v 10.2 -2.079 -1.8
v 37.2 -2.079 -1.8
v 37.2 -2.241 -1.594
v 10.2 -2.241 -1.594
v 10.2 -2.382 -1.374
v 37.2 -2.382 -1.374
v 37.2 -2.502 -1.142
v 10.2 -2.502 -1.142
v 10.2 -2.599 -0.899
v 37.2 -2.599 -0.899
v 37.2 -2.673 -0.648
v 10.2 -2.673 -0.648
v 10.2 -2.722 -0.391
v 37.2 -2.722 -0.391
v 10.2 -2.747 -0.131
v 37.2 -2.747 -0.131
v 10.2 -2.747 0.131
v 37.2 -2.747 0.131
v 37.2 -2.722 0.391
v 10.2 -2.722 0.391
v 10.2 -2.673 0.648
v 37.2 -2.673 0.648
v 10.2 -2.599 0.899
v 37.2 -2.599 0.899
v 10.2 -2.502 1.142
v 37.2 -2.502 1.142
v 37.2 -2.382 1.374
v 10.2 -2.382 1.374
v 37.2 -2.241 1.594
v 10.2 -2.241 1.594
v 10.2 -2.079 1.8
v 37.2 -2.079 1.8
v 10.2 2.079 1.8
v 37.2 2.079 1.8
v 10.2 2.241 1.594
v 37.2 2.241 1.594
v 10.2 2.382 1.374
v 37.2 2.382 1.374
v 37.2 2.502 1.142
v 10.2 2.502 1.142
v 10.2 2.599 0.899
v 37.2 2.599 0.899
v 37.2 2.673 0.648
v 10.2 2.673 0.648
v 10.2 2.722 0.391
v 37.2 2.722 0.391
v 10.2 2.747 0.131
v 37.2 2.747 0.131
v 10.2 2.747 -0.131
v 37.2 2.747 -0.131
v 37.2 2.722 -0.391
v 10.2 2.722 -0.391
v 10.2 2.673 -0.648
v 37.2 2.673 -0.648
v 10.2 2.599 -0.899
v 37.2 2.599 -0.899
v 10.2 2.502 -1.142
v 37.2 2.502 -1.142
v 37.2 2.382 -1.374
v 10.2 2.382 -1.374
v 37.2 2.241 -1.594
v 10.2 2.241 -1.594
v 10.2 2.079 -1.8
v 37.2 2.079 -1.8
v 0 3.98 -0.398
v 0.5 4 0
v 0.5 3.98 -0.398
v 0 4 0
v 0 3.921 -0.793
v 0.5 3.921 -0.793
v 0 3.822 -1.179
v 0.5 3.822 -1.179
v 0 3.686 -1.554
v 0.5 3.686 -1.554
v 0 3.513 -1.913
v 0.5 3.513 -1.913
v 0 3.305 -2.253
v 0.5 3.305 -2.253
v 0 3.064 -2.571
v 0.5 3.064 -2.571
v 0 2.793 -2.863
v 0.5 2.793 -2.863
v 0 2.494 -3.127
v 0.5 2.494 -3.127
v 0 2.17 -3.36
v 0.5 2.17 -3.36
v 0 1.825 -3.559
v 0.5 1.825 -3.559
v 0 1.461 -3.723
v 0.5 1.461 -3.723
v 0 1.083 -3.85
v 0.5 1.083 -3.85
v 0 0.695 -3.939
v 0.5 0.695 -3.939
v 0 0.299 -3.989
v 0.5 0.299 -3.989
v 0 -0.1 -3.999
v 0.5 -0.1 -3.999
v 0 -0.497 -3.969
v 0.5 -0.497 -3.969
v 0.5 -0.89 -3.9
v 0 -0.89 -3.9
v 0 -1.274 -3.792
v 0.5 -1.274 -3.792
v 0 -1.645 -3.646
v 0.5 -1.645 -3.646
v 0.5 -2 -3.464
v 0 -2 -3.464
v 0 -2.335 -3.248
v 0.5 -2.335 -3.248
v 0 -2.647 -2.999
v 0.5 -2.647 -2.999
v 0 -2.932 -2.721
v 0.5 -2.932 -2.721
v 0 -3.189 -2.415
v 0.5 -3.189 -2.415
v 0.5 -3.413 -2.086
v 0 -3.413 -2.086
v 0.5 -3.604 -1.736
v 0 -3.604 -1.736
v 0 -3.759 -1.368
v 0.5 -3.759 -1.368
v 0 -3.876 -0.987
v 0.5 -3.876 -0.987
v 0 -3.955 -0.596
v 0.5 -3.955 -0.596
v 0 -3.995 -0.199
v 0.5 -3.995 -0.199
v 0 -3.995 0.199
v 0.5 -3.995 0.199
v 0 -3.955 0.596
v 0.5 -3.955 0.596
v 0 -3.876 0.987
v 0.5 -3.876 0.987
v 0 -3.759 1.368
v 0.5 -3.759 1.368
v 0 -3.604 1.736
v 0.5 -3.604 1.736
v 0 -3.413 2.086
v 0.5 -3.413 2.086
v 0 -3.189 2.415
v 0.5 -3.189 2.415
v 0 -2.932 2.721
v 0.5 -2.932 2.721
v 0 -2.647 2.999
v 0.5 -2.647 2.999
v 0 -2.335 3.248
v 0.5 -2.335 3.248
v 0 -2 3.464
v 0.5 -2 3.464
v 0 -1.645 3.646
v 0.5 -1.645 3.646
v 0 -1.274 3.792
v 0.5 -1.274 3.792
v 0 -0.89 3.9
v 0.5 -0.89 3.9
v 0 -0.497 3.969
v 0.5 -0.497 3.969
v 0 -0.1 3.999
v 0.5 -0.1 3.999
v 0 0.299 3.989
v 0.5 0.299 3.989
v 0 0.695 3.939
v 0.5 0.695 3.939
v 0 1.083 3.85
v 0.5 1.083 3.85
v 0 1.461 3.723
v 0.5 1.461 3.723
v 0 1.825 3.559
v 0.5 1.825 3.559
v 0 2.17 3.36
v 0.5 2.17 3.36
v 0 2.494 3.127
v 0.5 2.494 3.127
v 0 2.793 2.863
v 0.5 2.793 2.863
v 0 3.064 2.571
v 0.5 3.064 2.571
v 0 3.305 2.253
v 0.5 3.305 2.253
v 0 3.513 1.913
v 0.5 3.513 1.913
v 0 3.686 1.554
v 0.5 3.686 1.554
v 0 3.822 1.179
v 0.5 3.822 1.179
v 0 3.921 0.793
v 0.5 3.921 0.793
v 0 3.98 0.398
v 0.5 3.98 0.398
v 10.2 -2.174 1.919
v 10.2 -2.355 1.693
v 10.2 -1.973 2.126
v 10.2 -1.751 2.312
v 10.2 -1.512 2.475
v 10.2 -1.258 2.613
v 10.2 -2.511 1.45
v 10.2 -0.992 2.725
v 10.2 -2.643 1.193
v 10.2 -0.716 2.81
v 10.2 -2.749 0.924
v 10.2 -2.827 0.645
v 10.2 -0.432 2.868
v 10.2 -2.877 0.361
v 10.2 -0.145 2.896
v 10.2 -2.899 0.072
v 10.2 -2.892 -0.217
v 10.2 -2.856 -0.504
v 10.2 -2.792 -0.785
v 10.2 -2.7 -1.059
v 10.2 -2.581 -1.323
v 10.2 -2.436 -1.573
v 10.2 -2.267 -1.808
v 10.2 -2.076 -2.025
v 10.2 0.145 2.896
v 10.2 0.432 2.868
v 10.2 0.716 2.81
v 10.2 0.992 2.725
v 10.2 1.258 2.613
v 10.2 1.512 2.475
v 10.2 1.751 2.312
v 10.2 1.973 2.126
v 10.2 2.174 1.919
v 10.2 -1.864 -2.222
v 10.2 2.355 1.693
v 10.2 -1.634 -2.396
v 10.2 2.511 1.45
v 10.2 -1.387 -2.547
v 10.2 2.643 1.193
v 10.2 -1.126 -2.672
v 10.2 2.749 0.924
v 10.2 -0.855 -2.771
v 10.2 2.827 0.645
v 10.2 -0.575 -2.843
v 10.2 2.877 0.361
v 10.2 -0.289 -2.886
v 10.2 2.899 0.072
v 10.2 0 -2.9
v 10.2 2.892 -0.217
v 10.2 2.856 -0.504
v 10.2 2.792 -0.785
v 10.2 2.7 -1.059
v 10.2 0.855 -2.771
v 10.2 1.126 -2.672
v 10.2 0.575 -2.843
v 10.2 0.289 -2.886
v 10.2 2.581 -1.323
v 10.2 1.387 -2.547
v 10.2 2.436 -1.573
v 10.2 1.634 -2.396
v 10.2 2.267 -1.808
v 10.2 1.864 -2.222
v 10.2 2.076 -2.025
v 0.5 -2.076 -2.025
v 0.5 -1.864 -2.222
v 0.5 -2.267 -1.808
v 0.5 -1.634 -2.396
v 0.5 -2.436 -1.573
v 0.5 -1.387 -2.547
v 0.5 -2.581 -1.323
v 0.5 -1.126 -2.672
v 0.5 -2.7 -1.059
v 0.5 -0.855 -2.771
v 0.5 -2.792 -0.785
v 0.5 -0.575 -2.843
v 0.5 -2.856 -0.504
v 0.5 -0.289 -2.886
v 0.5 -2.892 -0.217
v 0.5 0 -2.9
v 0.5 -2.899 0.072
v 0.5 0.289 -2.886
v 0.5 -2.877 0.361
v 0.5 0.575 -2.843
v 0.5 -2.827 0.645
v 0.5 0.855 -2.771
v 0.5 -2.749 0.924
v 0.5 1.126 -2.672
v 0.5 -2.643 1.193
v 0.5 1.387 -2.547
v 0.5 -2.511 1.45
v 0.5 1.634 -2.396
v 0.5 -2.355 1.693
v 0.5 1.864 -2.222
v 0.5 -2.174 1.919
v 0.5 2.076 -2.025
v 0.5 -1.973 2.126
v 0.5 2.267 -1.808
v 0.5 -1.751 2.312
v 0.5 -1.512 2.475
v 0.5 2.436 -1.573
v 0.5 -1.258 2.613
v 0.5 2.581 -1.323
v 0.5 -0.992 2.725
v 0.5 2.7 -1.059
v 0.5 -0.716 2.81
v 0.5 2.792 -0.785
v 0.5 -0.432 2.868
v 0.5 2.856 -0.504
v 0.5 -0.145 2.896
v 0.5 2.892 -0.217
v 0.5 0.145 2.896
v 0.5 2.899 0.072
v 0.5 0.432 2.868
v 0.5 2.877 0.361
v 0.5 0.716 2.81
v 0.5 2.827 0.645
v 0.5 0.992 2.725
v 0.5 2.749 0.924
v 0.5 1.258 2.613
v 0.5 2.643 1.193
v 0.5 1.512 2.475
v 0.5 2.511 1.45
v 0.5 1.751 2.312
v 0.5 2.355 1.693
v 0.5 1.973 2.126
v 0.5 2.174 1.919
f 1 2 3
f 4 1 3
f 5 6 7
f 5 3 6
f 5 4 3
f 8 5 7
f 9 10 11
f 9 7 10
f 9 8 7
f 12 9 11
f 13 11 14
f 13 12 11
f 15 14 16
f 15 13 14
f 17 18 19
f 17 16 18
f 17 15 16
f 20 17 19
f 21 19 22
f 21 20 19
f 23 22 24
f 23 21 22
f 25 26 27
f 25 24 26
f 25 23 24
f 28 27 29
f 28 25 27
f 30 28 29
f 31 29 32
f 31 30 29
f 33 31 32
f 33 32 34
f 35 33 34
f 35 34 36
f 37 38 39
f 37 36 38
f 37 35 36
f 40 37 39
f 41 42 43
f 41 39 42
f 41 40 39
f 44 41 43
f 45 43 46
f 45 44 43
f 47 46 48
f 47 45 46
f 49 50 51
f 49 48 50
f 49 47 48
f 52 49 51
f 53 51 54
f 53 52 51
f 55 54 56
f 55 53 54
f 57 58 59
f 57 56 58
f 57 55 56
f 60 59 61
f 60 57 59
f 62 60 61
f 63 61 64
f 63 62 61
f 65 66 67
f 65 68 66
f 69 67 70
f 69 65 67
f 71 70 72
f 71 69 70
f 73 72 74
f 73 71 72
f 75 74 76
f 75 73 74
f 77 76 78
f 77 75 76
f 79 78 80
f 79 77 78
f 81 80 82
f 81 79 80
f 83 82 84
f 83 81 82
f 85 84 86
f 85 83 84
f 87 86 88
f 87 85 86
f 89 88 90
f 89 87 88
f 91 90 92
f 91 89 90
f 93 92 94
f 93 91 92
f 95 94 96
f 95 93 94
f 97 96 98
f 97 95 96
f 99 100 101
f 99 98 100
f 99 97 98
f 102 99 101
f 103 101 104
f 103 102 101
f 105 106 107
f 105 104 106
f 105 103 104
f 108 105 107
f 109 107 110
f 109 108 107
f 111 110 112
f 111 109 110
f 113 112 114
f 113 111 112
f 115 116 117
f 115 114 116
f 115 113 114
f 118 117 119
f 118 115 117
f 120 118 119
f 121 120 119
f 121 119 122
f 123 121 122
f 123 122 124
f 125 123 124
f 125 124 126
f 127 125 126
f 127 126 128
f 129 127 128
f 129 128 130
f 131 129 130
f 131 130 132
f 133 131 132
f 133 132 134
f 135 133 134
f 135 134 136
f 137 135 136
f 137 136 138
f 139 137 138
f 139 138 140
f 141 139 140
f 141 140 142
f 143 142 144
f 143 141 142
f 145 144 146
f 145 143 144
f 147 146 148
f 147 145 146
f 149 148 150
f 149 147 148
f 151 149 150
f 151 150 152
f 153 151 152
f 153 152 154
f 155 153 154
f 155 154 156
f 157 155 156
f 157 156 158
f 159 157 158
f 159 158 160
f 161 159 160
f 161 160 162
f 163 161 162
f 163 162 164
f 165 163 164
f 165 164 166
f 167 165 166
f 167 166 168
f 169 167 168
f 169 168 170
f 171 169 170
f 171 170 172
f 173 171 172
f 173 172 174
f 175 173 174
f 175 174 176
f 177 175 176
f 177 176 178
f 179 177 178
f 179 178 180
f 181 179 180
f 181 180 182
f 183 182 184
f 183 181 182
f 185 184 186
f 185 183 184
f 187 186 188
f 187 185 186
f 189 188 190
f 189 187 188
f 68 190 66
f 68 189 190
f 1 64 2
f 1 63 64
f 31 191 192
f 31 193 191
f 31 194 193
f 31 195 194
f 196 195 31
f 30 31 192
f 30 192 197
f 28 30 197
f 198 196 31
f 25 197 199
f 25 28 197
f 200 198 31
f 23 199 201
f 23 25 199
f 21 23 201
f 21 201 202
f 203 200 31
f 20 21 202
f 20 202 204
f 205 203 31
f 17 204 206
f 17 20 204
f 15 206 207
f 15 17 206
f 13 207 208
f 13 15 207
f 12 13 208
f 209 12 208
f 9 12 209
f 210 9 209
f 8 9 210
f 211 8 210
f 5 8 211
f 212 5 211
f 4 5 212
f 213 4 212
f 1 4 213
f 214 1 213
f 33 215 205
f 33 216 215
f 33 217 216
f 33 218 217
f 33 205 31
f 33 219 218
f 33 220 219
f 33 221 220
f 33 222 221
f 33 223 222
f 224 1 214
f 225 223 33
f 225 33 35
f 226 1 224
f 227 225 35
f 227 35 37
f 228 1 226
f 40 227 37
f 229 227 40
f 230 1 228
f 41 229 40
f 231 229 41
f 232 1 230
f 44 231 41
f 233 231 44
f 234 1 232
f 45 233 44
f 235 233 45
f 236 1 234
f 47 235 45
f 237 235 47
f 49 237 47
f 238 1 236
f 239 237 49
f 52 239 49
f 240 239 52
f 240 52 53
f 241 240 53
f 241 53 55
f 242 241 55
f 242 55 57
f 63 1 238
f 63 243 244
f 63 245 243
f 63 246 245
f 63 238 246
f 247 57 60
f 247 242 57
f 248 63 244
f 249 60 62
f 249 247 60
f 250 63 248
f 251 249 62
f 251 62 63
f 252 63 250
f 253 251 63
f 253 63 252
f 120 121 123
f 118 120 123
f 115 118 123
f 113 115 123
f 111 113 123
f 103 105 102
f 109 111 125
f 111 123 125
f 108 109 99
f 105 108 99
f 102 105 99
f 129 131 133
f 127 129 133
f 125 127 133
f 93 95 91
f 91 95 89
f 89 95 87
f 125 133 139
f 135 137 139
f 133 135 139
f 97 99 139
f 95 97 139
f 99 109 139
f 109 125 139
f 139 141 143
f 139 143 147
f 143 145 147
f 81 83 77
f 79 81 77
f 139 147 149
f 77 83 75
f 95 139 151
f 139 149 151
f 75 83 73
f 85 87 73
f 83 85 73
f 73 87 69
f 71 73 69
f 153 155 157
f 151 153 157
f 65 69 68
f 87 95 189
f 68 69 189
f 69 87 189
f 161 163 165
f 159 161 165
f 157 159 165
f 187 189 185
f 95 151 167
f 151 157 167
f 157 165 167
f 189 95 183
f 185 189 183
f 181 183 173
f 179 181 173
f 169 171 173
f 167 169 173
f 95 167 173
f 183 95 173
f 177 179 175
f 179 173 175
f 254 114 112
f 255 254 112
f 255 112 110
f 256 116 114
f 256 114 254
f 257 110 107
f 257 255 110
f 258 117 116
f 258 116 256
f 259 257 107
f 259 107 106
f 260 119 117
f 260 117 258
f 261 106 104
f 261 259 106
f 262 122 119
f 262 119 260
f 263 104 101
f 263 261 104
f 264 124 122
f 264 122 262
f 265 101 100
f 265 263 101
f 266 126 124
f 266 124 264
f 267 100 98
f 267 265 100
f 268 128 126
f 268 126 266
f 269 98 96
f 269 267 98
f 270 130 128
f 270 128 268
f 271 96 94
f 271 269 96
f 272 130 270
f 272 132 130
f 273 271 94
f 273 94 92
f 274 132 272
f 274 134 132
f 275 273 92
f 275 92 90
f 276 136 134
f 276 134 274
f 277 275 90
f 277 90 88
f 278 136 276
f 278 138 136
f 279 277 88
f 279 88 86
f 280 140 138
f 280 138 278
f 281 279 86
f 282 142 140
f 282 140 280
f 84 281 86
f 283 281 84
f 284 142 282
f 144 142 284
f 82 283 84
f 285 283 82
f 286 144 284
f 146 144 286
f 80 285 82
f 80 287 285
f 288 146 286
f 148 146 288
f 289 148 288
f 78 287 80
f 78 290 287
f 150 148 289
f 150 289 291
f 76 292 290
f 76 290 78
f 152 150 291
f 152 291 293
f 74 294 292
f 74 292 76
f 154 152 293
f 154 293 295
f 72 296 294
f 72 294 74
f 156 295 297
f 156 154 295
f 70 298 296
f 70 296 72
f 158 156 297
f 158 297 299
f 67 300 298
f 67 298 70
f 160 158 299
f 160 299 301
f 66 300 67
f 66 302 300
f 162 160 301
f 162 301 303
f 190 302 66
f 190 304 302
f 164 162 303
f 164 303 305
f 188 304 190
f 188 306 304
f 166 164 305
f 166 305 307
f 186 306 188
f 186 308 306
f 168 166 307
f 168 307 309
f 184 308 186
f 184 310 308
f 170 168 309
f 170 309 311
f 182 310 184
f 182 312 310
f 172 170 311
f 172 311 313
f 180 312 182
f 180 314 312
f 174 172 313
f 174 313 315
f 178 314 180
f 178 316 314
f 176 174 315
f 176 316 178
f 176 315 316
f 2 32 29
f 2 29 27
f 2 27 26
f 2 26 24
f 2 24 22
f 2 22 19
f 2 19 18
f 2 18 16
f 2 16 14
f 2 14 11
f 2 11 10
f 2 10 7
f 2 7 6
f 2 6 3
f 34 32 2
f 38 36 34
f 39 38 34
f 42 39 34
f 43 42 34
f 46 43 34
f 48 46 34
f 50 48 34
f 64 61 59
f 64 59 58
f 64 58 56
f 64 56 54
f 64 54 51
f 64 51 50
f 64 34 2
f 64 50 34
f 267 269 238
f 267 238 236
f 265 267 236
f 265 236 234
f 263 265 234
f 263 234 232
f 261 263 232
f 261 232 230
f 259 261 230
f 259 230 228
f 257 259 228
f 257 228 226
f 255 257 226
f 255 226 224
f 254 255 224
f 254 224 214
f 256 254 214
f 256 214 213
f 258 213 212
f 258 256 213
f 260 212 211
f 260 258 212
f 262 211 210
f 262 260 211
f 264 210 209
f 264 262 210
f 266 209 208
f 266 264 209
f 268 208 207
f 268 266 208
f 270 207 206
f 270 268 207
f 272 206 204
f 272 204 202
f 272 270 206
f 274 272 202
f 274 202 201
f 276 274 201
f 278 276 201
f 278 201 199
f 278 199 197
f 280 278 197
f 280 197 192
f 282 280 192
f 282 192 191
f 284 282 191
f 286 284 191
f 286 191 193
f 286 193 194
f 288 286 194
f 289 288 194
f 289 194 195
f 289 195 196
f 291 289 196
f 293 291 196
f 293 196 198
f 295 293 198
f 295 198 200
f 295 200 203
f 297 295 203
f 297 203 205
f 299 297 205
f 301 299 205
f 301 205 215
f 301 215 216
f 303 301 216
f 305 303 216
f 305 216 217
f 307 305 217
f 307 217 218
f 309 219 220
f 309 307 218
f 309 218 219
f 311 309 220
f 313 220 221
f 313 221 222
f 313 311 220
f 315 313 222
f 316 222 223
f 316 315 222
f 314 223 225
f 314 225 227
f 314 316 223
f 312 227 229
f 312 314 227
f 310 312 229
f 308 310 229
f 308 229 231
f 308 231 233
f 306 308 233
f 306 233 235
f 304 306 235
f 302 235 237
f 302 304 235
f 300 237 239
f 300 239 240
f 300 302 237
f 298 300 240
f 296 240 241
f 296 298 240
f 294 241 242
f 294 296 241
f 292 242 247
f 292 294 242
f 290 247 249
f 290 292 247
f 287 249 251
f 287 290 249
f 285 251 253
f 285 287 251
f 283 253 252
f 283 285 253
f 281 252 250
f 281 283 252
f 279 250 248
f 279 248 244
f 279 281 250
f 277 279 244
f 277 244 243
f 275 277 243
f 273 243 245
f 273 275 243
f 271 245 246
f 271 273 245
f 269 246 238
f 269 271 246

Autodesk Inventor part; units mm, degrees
ref_plane "YZ Plane" through (0, 0, 0) normal (1, 0, 0) x (0, 1, 0)
ref_plane "XZ Plane" through (0, 0, 0) normal (0, 1, 0) x (-1, 0, 0)
ref_plane "XY Plane" through (0, 0, 0) normal (0, 0, 1) x (1, 0, 0)
sketch "Sketch1" plane through (0, 0, 0) normal (1, 0, 0) x (0, 1, 0)
  circle A0 centre (0, 0) radius 4
  dimension "d0" = 8
extrude "Extrusion1" add sketch "Sketch1" along normal blind 0.5
sketch "Sketch2" plane through (0.5, 0, 0) normal (1, 0, 0) x (0, 0, -1)
  circle A0 centre (0, 0) radius 2.9
  circle A1 centre (0, 0) radius 2.75
  line L0 (0, 0) -> (-1.8, 0)
  line L1 (-1.8, 0) -> (-1.8, 3.3564)
  line L2 (-1.8, 3.3564) -> (0, 3.3564)
  line L3 (0, 3.3564) -> (0, 0)
  line L4 (-1.8, 3.3564) -> (1.8, 3.3564)
  line L5 (1.8, 3.3564) -> (1.8, -4.1498)
  line L6 (1.8, -4.1498) -> (-1.8, -4.1498)
  line L7 (-1.8, -4.1498) -> (-1.8, 3.3564)
  dimension "d3" = 5.8
  dimension "d6" = 5.5
  dimension "d7" = 1.8
  dimension "d8" = 3.6
extrude "Extrusion2" add sketch "Sketch2" along normal blind 9.7 contours A0 L5 A1 | L5 A1 L3 A0 | A0 L7 A1 L5 | L3 A1 L1 A0 | L5 A1 L7 L0 L3 | A1 L5 | A0 L1 A1 L7 | L3 L0 L1 A1 | A1 L1 L7
sketch "Sketch3" plane through (10.2, 0, 0) normal (1, 0, 0) x (0, 0, -1)
  circle A0 centre (0, 0) radius 2.75
  line L0 (0, 0) -> (-1.8, 0)
  line L1 (-1.8, 0) -> (-1.8, 4.5353)
  line L2 (-1.8, 4.5353) -> (1.8, 4.5353)
  line L3 (1.8, 4.5353) -> (1.8, -4.8197)
  line L4 (1.8, -4.8197) -> (-1.8, -4.8197)
  line L5 (-1.8, -4.8197) -> (-1.8, 4.5353)
  point P0 (-1.8, -2.0791)
  point P1 (1.8, -2.0791)
  point P2 (1.8, 2.0791)
  point P3 (-1.8, 2.0791)
  dimension "d9" = 5.5
  dimension "d10" = 1.8
  dimension "d11" = 3.6
extrude "Extrusion3" add sketch "Sketch3" along normal blind 27 contours L3 A0 L5 L1
properties part number "wielas"
